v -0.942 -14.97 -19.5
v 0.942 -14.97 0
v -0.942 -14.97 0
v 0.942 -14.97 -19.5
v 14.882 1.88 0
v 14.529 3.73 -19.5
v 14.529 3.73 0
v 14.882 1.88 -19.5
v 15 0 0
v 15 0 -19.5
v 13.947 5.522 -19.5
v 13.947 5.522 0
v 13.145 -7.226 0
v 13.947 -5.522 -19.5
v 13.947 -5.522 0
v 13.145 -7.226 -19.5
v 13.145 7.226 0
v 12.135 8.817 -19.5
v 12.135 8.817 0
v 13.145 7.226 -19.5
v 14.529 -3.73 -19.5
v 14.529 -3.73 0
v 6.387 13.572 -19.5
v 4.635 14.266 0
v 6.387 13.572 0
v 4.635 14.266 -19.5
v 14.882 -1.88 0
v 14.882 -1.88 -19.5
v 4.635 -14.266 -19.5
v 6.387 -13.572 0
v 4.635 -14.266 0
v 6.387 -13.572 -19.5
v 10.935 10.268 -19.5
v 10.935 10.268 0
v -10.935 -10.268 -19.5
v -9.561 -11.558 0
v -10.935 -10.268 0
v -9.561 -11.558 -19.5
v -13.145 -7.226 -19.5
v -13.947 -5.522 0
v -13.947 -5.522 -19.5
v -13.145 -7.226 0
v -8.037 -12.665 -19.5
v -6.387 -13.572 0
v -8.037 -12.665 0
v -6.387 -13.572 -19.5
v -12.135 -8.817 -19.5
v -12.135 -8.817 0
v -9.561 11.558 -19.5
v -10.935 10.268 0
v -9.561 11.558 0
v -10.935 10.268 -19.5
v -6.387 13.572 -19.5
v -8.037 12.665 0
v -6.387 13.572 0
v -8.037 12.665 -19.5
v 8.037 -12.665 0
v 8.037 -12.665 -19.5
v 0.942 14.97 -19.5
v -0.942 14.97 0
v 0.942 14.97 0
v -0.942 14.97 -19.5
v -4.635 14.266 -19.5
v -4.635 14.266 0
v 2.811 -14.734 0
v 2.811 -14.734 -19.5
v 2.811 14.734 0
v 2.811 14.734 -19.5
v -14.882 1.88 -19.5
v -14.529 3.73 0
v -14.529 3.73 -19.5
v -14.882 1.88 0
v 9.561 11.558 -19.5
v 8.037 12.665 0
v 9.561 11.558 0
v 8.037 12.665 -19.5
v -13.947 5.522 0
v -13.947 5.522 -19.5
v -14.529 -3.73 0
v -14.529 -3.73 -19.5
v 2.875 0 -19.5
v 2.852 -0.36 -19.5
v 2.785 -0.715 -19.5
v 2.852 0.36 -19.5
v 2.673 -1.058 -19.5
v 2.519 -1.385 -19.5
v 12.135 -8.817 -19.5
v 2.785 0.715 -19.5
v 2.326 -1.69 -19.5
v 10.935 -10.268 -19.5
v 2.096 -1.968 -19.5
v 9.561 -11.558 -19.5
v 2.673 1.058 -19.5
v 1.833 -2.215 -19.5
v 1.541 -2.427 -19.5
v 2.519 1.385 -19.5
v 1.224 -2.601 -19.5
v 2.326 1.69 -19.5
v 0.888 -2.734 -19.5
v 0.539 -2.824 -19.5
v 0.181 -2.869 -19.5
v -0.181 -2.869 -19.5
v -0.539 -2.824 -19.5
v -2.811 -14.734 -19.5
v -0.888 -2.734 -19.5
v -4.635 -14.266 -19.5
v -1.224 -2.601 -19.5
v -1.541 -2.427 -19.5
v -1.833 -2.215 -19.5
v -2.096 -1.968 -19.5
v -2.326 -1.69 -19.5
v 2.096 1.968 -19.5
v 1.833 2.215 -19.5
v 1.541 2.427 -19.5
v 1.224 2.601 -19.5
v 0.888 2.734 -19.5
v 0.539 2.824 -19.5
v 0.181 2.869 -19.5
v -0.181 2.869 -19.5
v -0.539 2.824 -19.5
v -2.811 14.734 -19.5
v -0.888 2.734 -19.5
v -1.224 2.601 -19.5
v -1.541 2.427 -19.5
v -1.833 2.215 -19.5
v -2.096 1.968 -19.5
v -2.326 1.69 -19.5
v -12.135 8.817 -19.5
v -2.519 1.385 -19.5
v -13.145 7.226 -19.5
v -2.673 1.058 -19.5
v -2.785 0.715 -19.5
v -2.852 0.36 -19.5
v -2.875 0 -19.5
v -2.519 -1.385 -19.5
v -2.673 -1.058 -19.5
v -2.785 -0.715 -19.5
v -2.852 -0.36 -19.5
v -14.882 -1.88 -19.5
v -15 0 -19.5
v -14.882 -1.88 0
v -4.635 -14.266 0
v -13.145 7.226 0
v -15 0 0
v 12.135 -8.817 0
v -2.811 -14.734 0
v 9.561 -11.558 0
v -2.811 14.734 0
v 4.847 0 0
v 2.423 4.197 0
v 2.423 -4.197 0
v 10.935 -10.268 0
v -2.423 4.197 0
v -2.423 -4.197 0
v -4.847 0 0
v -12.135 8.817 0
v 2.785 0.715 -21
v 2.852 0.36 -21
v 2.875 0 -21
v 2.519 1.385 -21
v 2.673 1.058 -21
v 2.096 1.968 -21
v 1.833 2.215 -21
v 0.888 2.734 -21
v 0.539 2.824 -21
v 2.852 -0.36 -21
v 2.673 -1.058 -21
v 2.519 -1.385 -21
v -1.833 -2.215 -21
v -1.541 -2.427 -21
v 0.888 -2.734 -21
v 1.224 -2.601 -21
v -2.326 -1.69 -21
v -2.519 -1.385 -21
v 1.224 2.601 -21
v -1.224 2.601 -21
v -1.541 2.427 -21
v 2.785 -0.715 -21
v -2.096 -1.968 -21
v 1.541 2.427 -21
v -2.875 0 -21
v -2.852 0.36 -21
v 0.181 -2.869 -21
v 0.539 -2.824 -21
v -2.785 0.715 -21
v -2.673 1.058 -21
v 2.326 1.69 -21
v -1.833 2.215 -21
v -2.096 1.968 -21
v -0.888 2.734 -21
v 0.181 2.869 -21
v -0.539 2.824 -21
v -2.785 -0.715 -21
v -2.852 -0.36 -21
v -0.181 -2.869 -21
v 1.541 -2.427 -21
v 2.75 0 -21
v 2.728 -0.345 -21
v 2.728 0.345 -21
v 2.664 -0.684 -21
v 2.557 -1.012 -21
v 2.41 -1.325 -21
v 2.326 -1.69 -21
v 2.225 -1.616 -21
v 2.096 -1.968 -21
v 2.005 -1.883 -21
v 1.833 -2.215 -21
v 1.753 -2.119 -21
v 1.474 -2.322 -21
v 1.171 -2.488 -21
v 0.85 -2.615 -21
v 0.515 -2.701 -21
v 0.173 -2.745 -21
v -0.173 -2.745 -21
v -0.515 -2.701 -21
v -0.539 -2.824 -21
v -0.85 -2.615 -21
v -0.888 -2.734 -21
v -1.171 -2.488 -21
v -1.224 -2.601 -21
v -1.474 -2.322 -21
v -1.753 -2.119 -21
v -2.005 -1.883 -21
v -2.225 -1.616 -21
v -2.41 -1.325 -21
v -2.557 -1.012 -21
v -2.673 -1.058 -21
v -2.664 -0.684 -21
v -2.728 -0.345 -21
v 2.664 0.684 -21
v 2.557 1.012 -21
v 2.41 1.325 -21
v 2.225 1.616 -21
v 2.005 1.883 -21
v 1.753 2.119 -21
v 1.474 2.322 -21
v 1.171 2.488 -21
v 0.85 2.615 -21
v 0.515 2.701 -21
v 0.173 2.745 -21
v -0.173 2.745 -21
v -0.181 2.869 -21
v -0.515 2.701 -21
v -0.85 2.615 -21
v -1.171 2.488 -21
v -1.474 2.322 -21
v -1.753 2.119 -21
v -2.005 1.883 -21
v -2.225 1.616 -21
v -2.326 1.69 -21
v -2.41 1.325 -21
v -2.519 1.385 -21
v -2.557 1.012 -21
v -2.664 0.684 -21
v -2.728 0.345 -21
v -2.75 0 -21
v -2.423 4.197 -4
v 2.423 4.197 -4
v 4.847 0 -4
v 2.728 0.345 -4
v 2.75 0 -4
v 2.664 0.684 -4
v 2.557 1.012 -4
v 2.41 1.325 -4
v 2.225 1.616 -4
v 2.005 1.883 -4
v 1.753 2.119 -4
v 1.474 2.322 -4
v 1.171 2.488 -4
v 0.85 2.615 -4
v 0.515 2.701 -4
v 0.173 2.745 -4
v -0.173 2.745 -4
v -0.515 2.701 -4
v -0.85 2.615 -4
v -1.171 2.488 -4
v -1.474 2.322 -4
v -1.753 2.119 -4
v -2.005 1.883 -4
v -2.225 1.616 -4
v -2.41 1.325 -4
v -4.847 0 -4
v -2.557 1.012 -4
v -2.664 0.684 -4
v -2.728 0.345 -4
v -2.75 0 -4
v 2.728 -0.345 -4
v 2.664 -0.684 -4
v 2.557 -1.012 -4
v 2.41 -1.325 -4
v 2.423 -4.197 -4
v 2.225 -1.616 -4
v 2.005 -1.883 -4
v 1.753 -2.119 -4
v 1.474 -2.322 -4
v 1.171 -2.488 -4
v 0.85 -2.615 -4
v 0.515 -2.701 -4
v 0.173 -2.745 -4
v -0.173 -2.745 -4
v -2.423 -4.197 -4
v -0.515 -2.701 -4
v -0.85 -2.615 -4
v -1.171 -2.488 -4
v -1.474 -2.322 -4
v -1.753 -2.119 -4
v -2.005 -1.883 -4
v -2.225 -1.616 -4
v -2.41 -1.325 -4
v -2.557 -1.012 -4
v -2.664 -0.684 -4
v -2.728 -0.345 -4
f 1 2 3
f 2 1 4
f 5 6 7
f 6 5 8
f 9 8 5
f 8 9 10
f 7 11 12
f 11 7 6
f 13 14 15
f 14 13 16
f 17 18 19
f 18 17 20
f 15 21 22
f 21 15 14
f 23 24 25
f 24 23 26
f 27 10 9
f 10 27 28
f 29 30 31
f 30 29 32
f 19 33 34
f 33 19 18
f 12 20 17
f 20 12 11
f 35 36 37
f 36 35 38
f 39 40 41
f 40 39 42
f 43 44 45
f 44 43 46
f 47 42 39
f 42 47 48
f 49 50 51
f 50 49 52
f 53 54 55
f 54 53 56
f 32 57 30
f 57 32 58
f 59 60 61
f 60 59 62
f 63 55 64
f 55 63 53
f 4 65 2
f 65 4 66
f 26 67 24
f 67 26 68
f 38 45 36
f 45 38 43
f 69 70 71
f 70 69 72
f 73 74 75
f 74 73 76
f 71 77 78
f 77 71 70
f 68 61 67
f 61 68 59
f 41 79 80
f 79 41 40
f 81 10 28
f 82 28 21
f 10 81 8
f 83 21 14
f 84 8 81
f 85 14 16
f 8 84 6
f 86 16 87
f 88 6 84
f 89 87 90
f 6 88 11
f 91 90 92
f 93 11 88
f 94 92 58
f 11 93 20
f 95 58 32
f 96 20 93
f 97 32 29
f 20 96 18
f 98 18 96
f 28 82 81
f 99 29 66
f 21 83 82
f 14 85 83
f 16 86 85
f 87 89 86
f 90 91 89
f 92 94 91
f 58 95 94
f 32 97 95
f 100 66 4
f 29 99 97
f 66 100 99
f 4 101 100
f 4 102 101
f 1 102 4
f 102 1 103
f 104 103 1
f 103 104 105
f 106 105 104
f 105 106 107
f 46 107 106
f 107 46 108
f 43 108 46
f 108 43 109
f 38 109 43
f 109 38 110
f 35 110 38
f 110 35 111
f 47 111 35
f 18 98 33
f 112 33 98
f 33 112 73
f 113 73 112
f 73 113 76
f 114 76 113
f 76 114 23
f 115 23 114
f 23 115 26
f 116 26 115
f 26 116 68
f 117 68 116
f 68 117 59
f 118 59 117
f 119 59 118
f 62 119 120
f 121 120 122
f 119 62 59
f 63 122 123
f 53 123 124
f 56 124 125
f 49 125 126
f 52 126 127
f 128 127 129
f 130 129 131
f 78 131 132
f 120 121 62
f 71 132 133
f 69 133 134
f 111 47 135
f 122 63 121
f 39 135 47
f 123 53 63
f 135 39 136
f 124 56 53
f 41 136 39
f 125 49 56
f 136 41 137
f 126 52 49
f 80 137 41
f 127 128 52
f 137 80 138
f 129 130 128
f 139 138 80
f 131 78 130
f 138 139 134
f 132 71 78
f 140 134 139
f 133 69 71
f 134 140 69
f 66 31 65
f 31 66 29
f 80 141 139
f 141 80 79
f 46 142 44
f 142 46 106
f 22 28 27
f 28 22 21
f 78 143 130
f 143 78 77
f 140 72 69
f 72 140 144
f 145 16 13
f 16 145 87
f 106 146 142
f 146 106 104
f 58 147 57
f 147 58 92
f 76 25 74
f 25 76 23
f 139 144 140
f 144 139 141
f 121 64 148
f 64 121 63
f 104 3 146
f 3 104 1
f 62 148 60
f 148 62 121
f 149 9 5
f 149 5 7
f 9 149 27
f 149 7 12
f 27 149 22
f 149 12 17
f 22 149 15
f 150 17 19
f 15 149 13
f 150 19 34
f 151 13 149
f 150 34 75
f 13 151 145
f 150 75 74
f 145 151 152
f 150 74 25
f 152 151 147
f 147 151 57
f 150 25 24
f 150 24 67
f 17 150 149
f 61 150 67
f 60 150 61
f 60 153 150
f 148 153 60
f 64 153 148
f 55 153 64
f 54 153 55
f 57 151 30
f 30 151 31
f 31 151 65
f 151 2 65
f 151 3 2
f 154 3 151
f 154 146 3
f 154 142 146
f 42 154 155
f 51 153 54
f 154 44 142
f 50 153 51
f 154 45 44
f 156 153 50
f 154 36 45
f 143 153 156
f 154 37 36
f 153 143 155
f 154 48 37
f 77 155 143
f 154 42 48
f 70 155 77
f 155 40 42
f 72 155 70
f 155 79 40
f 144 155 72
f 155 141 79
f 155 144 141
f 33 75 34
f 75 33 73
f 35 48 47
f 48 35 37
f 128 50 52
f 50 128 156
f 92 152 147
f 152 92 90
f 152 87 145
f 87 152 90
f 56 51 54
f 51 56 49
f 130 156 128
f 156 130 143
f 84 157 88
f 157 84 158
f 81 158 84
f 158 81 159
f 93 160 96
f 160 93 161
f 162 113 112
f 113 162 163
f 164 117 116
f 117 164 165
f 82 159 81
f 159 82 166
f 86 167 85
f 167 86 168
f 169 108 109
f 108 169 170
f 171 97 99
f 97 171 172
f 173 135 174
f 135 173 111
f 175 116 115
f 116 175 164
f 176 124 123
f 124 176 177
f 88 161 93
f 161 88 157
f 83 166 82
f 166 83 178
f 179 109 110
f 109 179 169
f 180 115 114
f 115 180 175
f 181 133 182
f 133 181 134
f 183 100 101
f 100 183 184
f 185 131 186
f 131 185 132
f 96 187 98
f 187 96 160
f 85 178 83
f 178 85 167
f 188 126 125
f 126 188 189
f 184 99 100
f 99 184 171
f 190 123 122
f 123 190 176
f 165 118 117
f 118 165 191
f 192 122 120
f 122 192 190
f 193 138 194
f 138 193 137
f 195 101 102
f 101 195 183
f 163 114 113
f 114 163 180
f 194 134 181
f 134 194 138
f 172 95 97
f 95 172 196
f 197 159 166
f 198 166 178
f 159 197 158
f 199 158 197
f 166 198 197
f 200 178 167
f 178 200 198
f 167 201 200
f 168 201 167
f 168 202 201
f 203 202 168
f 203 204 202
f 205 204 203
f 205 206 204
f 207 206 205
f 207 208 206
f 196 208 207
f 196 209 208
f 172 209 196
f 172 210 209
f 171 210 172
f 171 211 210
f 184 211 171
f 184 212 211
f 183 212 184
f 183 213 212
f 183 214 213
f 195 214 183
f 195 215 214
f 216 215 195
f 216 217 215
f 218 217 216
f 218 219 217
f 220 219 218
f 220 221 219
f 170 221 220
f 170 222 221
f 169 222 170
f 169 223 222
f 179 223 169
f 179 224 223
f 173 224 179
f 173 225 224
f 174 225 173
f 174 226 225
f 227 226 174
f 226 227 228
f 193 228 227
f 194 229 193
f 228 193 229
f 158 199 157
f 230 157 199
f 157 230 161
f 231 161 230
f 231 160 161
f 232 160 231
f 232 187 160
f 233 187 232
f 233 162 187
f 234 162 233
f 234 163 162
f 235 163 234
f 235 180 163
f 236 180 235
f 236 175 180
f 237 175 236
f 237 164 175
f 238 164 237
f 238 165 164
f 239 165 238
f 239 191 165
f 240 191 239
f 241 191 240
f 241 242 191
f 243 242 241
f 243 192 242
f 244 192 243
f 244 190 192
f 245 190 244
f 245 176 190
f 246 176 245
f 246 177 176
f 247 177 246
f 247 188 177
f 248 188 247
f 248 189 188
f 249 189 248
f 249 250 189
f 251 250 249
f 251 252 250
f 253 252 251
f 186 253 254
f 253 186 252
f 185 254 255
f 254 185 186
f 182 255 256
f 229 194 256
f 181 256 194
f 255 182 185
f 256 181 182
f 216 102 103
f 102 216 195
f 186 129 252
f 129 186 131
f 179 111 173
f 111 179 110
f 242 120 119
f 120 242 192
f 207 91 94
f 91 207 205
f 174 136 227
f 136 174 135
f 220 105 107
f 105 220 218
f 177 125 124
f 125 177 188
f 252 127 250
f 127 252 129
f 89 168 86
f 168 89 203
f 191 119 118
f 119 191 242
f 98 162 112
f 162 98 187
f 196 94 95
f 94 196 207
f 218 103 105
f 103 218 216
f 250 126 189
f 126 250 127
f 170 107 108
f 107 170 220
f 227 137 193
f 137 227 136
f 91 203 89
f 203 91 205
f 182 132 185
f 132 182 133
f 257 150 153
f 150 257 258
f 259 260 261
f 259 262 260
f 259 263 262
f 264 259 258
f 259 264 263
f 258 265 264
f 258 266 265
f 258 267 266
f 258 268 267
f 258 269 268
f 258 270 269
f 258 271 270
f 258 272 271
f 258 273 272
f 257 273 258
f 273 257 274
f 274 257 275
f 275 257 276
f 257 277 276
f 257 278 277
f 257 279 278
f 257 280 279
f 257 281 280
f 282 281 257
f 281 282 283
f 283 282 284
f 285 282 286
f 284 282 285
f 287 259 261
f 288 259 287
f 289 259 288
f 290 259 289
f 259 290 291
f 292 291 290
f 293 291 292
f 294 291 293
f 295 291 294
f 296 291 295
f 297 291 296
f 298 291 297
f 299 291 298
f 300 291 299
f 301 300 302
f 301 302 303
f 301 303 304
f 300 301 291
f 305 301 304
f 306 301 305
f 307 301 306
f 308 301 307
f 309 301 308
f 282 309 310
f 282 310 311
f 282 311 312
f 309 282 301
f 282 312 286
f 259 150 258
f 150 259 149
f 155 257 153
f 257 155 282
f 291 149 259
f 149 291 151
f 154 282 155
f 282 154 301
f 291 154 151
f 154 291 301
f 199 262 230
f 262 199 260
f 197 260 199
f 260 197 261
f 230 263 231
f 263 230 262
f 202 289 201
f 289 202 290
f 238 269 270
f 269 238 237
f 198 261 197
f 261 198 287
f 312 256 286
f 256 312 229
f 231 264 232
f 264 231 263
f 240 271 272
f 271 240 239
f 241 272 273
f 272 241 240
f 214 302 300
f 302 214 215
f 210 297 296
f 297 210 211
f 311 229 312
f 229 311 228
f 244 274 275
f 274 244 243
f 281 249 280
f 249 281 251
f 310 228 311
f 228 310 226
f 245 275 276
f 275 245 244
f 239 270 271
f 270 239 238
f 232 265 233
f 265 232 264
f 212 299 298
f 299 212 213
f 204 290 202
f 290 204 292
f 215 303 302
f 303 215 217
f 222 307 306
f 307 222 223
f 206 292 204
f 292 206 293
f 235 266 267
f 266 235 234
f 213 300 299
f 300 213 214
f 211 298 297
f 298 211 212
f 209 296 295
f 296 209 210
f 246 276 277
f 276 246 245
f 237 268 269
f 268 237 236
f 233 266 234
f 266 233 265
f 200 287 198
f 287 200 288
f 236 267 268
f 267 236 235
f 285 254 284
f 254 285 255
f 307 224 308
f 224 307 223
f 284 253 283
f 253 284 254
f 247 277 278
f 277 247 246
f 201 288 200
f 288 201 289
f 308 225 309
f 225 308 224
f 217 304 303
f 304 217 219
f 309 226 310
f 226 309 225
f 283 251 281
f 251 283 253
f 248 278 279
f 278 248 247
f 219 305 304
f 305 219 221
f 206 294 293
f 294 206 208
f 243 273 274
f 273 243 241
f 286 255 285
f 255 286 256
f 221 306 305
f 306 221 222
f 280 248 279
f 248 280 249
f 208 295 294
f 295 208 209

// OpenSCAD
$fn = 50;

difference() {
	union() {
		translate(v = [0, 0, -19.5]) {
			cylinder(h = 19.5, r = 15.0);
		}
		#translate(v = [0, 0, -21.0]) {
			cylinder(h = 21, r = 2.875);
		}
	}
	union() {
		translate(v = [0, 0, 0]) {
			rotate(a = [0, 0, 0]) {
				difference() {
					union() {
						translate(v = [0, 0, -4]) {
							linear_extrude(height = 4) {
								polygon(points = [[4.8468, 0.0], [2.4234000000000004, 4.197451927062417], [-2.423399999999999, 4.197451927062417], [-4.8468, 5.935618106107392e-16], [-2.423400000000002, -4.197451927062416], [2.423399999999997, -4.197451927062419]]);
							}
						}
					}
					union();
				}
			}
		}
		#translate(v = [0, 0, -100.0]) {
			cylinder(h = 200, r = 2.75);
		}
	}
}
